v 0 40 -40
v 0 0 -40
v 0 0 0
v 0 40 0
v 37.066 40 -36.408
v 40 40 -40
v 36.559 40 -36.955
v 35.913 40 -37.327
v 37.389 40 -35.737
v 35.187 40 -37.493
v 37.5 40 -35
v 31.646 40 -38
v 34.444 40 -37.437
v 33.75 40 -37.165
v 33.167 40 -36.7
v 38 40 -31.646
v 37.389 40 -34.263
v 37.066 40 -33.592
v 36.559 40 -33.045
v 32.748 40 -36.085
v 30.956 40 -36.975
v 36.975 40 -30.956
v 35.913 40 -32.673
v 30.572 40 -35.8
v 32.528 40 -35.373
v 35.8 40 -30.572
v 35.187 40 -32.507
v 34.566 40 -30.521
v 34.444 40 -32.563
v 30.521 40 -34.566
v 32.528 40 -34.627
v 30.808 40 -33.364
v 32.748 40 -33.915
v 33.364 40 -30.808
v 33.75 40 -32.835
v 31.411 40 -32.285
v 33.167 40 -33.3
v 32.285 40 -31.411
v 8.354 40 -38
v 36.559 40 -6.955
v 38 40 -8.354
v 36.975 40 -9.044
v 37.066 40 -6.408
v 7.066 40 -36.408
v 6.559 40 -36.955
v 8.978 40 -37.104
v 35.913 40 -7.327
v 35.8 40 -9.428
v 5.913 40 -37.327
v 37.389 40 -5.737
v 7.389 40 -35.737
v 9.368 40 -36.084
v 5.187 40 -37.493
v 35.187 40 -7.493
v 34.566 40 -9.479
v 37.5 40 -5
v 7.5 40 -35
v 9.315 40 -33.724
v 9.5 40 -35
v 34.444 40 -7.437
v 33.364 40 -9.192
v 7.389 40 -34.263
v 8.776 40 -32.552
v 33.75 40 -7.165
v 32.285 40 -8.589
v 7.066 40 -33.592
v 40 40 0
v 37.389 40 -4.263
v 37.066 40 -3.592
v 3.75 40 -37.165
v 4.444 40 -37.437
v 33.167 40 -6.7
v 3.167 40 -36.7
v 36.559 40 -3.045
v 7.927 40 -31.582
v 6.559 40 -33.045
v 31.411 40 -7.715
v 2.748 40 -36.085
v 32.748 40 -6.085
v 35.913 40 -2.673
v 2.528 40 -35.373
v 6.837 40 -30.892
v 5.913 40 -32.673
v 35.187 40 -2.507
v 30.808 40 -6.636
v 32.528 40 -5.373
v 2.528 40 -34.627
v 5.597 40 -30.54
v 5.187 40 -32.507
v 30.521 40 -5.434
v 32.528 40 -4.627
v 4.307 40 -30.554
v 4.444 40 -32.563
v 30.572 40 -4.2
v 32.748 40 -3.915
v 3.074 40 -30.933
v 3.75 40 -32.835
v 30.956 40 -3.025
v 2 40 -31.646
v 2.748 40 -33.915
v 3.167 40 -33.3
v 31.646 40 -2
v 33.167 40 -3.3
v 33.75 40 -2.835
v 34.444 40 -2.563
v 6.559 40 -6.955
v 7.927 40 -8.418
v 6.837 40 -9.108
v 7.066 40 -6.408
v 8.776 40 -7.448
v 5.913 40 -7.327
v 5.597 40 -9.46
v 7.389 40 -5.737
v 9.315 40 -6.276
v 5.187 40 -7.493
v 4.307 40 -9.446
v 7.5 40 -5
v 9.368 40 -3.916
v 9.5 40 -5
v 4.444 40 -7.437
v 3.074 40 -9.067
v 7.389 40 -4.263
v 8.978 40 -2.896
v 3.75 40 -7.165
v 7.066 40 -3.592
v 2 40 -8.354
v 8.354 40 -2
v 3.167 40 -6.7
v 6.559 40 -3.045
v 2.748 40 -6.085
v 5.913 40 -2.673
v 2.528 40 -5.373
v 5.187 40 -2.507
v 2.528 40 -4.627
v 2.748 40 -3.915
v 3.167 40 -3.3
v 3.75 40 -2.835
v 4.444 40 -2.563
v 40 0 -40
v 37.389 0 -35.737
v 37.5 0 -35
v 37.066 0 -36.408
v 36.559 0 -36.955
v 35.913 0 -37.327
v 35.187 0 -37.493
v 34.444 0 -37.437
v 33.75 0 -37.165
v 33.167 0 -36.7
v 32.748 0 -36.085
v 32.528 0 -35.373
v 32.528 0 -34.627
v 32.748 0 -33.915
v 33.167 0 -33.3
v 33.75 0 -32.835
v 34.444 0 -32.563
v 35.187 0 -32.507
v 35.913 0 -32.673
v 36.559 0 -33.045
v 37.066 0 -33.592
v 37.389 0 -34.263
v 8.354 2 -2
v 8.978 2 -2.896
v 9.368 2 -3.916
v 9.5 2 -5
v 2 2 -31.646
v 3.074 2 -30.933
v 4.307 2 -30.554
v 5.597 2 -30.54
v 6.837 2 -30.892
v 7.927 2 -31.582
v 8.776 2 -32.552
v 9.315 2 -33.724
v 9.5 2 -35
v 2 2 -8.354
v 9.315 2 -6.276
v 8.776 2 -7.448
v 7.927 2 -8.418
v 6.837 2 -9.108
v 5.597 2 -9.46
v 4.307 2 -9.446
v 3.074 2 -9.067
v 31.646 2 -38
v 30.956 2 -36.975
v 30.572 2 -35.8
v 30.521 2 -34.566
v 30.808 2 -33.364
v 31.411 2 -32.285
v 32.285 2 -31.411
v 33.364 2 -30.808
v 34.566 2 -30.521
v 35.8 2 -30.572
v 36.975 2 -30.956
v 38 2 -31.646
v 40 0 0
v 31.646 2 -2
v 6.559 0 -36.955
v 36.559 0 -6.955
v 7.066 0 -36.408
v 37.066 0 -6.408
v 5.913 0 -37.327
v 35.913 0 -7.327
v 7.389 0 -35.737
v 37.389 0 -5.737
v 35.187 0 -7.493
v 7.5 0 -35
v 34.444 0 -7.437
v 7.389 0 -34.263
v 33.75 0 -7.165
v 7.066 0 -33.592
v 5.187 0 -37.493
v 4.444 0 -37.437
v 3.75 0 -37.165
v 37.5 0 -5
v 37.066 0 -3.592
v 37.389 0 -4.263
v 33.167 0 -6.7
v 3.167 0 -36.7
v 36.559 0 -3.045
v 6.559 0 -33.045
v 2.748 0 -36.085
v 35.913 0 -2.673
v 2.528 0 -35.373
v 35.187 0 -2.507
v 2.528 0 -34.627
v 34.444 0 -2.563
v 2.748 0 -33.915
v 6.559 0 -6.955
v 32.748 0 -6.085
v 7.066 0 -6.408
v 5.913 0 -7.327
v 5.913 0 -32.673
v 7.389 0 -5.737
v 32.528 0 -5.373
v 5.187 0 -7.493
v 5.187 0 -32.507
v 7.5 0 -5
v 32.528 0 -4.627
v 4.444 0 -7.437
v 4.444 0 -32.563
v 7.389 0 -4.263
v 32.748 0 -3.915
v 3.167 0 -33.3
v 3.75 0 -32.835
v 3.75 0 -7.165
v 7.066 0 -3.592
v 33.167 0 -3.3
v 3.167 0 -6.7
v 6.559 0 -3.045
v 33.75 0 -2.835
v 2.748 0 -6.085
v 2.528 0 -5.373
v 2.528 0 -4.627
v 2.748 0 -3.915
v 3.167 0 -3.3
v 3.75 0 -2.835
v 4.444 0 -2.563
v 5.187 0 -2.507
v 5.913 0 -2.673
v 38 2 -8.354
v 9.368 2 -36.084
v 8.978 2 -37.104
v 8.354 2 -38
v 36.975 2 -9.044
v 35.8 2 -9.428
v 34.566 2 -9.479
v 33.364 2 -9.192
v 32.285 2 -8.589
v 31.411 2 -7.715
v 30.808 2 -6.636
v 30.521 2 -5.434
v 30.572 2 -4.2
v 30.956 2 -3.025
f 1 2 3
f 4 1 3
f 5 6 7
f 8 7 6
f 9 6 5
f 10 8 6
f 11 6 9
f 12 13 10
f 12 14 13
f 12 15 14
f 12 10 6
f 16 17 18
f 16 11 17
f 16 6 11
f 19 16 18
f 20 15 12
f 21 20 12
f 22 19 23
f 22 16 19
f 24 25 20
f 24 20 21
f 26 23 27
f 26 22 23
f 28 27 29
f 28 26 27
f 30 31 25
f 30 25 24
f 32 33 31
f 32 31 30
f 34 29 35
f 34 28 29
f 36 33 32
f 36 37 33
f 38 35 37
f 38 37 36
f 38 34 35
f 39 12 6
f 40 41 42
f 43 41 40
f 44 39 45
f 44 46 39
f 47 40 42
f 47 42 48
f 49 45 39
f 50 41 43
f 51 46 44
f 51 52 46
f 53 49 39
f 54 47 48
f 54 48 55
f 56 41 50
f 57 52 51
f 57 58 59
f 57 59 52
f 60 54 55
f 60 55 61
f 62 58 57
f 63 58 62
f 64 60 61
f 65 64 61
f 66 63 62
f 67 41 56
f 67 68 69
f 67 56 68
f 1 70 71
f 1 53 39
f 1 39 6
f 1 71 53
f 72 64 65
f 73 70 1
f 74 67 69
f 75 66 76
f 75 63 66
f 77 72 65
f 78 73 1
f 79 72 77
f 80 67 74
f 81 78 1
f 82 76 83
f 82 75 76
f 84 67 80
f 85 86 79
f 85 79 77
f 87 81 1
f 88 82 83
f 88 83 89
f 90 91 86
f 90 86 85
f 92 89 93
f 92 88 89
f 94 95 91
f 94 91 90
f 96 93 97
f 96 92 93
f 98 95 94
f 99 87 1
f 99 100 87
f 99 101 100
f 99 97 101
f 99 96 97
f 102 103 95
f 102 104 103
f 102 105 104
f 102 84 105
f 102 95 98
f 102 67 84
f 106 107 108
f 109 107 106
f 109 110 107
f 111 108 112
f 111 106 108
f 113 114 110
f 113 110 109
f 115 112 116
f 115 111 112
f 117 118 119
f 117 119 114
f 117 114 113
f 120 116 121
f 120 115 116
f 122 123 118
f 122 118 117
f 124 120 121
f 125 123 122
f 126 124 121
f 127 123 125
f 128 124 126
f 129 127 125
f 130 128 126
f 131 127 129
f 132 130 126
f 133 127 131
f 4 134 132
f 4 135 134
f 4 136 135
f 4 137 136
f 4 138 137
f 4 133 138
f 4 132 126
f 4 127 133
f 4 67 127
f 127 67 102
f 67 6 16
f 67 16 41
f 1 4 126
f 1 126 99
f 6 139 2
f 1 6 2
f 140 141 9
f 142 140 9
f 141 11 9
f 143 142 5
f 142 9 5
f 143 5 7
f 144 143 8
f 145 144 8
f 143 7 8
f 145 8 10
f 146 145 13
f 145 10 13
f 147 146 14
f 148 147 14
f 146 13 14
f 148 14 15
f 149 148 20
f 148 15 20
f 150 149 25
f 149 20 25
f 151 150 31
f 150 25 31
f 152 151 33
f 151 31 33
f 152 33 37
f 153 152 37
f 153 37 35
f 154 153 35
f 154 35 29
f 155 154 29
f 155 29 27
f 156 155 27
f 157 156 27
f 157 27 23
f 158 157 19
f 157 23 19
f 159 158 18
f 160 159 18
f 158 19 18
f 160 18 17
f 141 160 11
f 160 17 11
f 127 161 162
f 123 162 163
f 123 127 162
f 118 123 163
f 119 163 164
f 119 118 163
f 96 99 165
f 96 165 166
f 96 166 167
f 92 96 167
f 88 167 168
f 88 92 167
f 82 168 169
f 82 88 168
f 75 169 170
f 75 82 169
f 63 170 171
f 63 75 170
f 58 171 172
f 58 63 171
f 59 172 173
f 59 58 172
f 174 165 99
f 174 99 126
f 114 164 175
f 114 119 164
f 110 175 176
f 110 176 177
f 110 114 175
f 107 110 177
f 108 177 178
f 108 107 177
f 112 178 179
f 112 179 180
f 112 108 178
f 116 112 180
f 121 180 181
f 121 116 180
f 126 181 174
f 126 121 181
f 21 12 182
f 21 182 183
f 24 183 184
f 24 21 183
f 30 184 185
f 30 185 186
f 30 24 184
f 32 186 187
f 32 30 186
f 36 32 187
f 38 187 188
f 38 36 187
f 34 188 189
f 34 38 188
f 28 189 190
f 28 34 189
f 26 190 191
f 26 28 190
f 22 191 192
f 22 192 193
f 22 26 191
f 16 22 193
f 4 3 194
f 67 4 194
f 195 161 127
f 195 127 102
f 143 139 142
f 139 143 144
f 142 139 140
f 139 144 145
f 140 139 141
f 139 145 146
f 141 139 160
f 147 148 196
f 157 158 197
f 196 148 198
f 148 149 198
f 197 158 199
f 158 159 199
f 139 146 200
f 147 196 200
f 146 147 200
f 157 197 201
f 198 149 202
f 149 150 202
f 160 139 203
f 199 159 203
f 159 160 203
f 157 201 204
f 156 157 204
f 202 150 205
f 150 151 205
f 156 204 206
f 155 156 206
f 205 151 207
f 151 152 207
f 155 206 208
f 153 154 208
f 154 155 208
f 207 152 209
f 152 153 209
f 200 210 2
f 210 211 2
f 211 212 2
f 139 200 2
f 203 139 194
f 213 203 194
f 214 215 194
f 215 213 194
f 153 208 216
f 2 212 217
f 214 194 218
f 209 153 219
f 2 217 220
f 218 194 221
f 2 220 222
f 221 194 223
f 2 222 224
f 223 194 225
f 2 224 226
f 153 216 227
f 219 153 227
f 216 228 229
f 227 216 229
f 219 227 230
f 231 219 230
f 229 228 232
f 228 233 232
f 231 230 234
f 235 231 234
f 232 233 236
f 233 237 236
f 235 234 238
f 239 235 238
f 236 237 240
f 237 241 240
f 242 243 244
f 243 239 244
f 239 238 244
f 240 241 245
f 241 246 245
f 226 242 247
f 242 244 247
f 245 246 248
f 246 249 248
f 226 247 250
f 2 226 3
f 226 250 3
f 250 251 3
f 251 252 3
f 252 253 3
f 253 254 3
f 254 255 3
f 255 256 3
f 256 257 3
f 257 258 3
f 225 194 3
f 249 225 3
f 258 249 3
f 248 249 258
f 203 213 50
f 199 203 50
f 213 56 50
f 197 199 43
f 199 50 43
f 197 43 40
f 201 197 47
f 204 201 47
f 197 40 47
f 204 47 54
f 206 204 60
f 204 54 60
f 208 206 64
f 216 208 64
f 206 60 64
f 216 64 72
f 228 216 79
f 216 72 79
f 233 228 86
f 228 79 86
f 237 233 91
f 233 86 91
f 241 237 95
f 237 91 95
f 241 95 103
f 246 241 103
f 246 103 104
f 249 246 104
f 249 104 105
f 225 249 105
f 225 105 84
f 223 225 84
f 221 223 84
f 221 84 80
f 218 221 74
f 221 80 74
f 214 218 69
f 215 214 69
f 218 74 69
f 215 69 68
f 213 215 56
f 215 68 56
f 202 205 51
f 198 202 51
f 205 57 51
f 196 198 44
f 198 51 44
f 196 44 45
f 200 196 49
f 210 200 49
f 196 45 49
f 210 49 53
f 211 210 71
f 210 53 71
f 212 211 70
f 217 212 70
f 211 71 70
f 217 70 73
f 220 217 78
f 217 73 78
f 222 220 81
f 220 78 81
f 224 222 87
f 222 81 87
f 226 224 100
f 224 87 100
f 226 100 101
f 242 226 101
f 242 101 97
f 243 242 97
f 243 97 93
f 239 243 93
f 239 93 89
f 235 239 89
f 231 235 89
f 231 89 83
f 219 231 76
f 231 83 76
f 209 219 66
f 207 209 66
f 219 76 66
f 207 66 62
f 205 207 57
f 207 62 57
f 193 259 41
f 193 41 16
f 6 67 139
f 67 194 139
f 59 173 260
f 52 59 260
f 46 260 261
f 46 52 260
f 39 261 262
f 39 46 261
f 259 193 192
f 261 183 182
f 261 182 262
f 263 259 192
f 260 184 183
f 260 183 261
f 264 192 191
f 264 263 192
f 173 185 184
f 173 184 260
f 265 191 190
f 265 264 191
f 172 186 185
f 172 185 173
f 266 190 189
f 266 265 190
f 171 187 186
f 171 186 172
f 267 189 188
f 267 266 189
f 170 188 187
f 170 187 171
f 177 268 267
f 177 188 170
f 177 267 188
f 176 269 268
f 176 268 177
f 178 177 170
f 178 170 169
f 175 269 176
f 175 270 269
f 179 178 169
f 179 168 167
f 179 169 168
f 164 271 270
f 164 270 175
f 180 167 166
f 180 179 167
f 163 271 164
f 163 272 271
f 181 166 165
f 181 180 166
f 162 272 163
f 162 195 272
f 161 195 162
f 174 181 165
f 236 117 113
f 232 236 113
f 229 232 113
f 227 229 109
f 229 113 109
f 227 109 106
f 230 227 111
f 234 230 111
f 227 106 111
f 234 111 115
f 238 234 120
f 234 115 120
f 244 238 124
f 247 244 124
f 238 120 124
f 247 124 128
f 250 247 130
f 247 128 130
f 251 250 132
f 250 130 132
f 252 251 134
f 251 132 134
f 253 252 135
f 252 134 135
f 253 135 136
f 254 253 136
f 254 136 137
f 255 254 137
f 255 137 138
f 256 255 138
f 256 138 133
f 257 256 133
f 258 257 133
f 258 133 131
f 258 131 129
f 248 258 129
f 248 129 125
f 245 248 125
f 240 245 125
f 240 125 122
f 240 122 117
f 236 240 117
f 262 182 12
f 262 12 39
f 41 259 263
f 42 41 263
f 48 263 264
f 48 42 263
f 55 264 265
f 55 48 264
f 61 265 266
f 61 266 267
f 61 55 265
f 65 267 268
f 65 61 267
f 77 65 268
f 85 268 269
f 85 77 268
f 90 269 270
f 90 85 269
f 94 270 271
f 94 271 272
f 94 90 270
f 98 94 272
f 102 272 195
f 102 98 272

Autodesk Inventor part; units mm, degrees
ref_plane "YZ Plane" through (0, 0, 0) normal (1, 0, 0) x (0, 1, 0)
ref_plane "XZ Plane" through (0, 0, 0) normal (0, 1, 0) x (-1, 0, 0)
ref_plane "XY Plane" through (0, 0, 0) normal (0, 0, 1) x (1, 0, 0)
sketch "cube_profile" plane through (0, 0, 0) normal (0, 1, 0) x (-1, 0, 0)
  line L0 (0, 0) -> (-40, 0)
  line L1 (-40, 0) -> (-40, -40)
  line L2 (-40, -40) -> (0, -40)
  line L3 (0, -40) -> (0, 0)
  dimension "d2" = 40
  dimension "d4" = 40
extrude "Extrusion1" add sketch "cube_profile" along normal blind 40
sketch "Sketch2" plane through (0, 40, 0) normal (0, 1, 0) x (1, 0, 0)
  line L0 (40, 40) -> (0, 40) projected
  line L1 (0, 40) -> (0, 0) projected
  circle A0 centre (5, 35) radius 2.5
  circle A1 centre (35, 35) radius 2.5
  circle A2 centre (5, 5) radius 2.5
  circle A3 centre (35, 5) radius 2.5
  dimension "d8" = 5
  dimension "d9" = 5
  dimension "d10" = 5
  dimension "d13" = 30
  dimension "d16" = 30
extrude "Extrusion2" cut sketch "Sketch2" against normal blind 50.325
shell "Shell1" thickness 2 removed faces 1 at (24.3762, 40, -24.4474)
sketch "Sketch3" plane through (0, 0, 0) normal (0, 0, 1) x (1, 0, 0)
  point P0 (0, 0)
properties part number "INTRO_CUBE"
